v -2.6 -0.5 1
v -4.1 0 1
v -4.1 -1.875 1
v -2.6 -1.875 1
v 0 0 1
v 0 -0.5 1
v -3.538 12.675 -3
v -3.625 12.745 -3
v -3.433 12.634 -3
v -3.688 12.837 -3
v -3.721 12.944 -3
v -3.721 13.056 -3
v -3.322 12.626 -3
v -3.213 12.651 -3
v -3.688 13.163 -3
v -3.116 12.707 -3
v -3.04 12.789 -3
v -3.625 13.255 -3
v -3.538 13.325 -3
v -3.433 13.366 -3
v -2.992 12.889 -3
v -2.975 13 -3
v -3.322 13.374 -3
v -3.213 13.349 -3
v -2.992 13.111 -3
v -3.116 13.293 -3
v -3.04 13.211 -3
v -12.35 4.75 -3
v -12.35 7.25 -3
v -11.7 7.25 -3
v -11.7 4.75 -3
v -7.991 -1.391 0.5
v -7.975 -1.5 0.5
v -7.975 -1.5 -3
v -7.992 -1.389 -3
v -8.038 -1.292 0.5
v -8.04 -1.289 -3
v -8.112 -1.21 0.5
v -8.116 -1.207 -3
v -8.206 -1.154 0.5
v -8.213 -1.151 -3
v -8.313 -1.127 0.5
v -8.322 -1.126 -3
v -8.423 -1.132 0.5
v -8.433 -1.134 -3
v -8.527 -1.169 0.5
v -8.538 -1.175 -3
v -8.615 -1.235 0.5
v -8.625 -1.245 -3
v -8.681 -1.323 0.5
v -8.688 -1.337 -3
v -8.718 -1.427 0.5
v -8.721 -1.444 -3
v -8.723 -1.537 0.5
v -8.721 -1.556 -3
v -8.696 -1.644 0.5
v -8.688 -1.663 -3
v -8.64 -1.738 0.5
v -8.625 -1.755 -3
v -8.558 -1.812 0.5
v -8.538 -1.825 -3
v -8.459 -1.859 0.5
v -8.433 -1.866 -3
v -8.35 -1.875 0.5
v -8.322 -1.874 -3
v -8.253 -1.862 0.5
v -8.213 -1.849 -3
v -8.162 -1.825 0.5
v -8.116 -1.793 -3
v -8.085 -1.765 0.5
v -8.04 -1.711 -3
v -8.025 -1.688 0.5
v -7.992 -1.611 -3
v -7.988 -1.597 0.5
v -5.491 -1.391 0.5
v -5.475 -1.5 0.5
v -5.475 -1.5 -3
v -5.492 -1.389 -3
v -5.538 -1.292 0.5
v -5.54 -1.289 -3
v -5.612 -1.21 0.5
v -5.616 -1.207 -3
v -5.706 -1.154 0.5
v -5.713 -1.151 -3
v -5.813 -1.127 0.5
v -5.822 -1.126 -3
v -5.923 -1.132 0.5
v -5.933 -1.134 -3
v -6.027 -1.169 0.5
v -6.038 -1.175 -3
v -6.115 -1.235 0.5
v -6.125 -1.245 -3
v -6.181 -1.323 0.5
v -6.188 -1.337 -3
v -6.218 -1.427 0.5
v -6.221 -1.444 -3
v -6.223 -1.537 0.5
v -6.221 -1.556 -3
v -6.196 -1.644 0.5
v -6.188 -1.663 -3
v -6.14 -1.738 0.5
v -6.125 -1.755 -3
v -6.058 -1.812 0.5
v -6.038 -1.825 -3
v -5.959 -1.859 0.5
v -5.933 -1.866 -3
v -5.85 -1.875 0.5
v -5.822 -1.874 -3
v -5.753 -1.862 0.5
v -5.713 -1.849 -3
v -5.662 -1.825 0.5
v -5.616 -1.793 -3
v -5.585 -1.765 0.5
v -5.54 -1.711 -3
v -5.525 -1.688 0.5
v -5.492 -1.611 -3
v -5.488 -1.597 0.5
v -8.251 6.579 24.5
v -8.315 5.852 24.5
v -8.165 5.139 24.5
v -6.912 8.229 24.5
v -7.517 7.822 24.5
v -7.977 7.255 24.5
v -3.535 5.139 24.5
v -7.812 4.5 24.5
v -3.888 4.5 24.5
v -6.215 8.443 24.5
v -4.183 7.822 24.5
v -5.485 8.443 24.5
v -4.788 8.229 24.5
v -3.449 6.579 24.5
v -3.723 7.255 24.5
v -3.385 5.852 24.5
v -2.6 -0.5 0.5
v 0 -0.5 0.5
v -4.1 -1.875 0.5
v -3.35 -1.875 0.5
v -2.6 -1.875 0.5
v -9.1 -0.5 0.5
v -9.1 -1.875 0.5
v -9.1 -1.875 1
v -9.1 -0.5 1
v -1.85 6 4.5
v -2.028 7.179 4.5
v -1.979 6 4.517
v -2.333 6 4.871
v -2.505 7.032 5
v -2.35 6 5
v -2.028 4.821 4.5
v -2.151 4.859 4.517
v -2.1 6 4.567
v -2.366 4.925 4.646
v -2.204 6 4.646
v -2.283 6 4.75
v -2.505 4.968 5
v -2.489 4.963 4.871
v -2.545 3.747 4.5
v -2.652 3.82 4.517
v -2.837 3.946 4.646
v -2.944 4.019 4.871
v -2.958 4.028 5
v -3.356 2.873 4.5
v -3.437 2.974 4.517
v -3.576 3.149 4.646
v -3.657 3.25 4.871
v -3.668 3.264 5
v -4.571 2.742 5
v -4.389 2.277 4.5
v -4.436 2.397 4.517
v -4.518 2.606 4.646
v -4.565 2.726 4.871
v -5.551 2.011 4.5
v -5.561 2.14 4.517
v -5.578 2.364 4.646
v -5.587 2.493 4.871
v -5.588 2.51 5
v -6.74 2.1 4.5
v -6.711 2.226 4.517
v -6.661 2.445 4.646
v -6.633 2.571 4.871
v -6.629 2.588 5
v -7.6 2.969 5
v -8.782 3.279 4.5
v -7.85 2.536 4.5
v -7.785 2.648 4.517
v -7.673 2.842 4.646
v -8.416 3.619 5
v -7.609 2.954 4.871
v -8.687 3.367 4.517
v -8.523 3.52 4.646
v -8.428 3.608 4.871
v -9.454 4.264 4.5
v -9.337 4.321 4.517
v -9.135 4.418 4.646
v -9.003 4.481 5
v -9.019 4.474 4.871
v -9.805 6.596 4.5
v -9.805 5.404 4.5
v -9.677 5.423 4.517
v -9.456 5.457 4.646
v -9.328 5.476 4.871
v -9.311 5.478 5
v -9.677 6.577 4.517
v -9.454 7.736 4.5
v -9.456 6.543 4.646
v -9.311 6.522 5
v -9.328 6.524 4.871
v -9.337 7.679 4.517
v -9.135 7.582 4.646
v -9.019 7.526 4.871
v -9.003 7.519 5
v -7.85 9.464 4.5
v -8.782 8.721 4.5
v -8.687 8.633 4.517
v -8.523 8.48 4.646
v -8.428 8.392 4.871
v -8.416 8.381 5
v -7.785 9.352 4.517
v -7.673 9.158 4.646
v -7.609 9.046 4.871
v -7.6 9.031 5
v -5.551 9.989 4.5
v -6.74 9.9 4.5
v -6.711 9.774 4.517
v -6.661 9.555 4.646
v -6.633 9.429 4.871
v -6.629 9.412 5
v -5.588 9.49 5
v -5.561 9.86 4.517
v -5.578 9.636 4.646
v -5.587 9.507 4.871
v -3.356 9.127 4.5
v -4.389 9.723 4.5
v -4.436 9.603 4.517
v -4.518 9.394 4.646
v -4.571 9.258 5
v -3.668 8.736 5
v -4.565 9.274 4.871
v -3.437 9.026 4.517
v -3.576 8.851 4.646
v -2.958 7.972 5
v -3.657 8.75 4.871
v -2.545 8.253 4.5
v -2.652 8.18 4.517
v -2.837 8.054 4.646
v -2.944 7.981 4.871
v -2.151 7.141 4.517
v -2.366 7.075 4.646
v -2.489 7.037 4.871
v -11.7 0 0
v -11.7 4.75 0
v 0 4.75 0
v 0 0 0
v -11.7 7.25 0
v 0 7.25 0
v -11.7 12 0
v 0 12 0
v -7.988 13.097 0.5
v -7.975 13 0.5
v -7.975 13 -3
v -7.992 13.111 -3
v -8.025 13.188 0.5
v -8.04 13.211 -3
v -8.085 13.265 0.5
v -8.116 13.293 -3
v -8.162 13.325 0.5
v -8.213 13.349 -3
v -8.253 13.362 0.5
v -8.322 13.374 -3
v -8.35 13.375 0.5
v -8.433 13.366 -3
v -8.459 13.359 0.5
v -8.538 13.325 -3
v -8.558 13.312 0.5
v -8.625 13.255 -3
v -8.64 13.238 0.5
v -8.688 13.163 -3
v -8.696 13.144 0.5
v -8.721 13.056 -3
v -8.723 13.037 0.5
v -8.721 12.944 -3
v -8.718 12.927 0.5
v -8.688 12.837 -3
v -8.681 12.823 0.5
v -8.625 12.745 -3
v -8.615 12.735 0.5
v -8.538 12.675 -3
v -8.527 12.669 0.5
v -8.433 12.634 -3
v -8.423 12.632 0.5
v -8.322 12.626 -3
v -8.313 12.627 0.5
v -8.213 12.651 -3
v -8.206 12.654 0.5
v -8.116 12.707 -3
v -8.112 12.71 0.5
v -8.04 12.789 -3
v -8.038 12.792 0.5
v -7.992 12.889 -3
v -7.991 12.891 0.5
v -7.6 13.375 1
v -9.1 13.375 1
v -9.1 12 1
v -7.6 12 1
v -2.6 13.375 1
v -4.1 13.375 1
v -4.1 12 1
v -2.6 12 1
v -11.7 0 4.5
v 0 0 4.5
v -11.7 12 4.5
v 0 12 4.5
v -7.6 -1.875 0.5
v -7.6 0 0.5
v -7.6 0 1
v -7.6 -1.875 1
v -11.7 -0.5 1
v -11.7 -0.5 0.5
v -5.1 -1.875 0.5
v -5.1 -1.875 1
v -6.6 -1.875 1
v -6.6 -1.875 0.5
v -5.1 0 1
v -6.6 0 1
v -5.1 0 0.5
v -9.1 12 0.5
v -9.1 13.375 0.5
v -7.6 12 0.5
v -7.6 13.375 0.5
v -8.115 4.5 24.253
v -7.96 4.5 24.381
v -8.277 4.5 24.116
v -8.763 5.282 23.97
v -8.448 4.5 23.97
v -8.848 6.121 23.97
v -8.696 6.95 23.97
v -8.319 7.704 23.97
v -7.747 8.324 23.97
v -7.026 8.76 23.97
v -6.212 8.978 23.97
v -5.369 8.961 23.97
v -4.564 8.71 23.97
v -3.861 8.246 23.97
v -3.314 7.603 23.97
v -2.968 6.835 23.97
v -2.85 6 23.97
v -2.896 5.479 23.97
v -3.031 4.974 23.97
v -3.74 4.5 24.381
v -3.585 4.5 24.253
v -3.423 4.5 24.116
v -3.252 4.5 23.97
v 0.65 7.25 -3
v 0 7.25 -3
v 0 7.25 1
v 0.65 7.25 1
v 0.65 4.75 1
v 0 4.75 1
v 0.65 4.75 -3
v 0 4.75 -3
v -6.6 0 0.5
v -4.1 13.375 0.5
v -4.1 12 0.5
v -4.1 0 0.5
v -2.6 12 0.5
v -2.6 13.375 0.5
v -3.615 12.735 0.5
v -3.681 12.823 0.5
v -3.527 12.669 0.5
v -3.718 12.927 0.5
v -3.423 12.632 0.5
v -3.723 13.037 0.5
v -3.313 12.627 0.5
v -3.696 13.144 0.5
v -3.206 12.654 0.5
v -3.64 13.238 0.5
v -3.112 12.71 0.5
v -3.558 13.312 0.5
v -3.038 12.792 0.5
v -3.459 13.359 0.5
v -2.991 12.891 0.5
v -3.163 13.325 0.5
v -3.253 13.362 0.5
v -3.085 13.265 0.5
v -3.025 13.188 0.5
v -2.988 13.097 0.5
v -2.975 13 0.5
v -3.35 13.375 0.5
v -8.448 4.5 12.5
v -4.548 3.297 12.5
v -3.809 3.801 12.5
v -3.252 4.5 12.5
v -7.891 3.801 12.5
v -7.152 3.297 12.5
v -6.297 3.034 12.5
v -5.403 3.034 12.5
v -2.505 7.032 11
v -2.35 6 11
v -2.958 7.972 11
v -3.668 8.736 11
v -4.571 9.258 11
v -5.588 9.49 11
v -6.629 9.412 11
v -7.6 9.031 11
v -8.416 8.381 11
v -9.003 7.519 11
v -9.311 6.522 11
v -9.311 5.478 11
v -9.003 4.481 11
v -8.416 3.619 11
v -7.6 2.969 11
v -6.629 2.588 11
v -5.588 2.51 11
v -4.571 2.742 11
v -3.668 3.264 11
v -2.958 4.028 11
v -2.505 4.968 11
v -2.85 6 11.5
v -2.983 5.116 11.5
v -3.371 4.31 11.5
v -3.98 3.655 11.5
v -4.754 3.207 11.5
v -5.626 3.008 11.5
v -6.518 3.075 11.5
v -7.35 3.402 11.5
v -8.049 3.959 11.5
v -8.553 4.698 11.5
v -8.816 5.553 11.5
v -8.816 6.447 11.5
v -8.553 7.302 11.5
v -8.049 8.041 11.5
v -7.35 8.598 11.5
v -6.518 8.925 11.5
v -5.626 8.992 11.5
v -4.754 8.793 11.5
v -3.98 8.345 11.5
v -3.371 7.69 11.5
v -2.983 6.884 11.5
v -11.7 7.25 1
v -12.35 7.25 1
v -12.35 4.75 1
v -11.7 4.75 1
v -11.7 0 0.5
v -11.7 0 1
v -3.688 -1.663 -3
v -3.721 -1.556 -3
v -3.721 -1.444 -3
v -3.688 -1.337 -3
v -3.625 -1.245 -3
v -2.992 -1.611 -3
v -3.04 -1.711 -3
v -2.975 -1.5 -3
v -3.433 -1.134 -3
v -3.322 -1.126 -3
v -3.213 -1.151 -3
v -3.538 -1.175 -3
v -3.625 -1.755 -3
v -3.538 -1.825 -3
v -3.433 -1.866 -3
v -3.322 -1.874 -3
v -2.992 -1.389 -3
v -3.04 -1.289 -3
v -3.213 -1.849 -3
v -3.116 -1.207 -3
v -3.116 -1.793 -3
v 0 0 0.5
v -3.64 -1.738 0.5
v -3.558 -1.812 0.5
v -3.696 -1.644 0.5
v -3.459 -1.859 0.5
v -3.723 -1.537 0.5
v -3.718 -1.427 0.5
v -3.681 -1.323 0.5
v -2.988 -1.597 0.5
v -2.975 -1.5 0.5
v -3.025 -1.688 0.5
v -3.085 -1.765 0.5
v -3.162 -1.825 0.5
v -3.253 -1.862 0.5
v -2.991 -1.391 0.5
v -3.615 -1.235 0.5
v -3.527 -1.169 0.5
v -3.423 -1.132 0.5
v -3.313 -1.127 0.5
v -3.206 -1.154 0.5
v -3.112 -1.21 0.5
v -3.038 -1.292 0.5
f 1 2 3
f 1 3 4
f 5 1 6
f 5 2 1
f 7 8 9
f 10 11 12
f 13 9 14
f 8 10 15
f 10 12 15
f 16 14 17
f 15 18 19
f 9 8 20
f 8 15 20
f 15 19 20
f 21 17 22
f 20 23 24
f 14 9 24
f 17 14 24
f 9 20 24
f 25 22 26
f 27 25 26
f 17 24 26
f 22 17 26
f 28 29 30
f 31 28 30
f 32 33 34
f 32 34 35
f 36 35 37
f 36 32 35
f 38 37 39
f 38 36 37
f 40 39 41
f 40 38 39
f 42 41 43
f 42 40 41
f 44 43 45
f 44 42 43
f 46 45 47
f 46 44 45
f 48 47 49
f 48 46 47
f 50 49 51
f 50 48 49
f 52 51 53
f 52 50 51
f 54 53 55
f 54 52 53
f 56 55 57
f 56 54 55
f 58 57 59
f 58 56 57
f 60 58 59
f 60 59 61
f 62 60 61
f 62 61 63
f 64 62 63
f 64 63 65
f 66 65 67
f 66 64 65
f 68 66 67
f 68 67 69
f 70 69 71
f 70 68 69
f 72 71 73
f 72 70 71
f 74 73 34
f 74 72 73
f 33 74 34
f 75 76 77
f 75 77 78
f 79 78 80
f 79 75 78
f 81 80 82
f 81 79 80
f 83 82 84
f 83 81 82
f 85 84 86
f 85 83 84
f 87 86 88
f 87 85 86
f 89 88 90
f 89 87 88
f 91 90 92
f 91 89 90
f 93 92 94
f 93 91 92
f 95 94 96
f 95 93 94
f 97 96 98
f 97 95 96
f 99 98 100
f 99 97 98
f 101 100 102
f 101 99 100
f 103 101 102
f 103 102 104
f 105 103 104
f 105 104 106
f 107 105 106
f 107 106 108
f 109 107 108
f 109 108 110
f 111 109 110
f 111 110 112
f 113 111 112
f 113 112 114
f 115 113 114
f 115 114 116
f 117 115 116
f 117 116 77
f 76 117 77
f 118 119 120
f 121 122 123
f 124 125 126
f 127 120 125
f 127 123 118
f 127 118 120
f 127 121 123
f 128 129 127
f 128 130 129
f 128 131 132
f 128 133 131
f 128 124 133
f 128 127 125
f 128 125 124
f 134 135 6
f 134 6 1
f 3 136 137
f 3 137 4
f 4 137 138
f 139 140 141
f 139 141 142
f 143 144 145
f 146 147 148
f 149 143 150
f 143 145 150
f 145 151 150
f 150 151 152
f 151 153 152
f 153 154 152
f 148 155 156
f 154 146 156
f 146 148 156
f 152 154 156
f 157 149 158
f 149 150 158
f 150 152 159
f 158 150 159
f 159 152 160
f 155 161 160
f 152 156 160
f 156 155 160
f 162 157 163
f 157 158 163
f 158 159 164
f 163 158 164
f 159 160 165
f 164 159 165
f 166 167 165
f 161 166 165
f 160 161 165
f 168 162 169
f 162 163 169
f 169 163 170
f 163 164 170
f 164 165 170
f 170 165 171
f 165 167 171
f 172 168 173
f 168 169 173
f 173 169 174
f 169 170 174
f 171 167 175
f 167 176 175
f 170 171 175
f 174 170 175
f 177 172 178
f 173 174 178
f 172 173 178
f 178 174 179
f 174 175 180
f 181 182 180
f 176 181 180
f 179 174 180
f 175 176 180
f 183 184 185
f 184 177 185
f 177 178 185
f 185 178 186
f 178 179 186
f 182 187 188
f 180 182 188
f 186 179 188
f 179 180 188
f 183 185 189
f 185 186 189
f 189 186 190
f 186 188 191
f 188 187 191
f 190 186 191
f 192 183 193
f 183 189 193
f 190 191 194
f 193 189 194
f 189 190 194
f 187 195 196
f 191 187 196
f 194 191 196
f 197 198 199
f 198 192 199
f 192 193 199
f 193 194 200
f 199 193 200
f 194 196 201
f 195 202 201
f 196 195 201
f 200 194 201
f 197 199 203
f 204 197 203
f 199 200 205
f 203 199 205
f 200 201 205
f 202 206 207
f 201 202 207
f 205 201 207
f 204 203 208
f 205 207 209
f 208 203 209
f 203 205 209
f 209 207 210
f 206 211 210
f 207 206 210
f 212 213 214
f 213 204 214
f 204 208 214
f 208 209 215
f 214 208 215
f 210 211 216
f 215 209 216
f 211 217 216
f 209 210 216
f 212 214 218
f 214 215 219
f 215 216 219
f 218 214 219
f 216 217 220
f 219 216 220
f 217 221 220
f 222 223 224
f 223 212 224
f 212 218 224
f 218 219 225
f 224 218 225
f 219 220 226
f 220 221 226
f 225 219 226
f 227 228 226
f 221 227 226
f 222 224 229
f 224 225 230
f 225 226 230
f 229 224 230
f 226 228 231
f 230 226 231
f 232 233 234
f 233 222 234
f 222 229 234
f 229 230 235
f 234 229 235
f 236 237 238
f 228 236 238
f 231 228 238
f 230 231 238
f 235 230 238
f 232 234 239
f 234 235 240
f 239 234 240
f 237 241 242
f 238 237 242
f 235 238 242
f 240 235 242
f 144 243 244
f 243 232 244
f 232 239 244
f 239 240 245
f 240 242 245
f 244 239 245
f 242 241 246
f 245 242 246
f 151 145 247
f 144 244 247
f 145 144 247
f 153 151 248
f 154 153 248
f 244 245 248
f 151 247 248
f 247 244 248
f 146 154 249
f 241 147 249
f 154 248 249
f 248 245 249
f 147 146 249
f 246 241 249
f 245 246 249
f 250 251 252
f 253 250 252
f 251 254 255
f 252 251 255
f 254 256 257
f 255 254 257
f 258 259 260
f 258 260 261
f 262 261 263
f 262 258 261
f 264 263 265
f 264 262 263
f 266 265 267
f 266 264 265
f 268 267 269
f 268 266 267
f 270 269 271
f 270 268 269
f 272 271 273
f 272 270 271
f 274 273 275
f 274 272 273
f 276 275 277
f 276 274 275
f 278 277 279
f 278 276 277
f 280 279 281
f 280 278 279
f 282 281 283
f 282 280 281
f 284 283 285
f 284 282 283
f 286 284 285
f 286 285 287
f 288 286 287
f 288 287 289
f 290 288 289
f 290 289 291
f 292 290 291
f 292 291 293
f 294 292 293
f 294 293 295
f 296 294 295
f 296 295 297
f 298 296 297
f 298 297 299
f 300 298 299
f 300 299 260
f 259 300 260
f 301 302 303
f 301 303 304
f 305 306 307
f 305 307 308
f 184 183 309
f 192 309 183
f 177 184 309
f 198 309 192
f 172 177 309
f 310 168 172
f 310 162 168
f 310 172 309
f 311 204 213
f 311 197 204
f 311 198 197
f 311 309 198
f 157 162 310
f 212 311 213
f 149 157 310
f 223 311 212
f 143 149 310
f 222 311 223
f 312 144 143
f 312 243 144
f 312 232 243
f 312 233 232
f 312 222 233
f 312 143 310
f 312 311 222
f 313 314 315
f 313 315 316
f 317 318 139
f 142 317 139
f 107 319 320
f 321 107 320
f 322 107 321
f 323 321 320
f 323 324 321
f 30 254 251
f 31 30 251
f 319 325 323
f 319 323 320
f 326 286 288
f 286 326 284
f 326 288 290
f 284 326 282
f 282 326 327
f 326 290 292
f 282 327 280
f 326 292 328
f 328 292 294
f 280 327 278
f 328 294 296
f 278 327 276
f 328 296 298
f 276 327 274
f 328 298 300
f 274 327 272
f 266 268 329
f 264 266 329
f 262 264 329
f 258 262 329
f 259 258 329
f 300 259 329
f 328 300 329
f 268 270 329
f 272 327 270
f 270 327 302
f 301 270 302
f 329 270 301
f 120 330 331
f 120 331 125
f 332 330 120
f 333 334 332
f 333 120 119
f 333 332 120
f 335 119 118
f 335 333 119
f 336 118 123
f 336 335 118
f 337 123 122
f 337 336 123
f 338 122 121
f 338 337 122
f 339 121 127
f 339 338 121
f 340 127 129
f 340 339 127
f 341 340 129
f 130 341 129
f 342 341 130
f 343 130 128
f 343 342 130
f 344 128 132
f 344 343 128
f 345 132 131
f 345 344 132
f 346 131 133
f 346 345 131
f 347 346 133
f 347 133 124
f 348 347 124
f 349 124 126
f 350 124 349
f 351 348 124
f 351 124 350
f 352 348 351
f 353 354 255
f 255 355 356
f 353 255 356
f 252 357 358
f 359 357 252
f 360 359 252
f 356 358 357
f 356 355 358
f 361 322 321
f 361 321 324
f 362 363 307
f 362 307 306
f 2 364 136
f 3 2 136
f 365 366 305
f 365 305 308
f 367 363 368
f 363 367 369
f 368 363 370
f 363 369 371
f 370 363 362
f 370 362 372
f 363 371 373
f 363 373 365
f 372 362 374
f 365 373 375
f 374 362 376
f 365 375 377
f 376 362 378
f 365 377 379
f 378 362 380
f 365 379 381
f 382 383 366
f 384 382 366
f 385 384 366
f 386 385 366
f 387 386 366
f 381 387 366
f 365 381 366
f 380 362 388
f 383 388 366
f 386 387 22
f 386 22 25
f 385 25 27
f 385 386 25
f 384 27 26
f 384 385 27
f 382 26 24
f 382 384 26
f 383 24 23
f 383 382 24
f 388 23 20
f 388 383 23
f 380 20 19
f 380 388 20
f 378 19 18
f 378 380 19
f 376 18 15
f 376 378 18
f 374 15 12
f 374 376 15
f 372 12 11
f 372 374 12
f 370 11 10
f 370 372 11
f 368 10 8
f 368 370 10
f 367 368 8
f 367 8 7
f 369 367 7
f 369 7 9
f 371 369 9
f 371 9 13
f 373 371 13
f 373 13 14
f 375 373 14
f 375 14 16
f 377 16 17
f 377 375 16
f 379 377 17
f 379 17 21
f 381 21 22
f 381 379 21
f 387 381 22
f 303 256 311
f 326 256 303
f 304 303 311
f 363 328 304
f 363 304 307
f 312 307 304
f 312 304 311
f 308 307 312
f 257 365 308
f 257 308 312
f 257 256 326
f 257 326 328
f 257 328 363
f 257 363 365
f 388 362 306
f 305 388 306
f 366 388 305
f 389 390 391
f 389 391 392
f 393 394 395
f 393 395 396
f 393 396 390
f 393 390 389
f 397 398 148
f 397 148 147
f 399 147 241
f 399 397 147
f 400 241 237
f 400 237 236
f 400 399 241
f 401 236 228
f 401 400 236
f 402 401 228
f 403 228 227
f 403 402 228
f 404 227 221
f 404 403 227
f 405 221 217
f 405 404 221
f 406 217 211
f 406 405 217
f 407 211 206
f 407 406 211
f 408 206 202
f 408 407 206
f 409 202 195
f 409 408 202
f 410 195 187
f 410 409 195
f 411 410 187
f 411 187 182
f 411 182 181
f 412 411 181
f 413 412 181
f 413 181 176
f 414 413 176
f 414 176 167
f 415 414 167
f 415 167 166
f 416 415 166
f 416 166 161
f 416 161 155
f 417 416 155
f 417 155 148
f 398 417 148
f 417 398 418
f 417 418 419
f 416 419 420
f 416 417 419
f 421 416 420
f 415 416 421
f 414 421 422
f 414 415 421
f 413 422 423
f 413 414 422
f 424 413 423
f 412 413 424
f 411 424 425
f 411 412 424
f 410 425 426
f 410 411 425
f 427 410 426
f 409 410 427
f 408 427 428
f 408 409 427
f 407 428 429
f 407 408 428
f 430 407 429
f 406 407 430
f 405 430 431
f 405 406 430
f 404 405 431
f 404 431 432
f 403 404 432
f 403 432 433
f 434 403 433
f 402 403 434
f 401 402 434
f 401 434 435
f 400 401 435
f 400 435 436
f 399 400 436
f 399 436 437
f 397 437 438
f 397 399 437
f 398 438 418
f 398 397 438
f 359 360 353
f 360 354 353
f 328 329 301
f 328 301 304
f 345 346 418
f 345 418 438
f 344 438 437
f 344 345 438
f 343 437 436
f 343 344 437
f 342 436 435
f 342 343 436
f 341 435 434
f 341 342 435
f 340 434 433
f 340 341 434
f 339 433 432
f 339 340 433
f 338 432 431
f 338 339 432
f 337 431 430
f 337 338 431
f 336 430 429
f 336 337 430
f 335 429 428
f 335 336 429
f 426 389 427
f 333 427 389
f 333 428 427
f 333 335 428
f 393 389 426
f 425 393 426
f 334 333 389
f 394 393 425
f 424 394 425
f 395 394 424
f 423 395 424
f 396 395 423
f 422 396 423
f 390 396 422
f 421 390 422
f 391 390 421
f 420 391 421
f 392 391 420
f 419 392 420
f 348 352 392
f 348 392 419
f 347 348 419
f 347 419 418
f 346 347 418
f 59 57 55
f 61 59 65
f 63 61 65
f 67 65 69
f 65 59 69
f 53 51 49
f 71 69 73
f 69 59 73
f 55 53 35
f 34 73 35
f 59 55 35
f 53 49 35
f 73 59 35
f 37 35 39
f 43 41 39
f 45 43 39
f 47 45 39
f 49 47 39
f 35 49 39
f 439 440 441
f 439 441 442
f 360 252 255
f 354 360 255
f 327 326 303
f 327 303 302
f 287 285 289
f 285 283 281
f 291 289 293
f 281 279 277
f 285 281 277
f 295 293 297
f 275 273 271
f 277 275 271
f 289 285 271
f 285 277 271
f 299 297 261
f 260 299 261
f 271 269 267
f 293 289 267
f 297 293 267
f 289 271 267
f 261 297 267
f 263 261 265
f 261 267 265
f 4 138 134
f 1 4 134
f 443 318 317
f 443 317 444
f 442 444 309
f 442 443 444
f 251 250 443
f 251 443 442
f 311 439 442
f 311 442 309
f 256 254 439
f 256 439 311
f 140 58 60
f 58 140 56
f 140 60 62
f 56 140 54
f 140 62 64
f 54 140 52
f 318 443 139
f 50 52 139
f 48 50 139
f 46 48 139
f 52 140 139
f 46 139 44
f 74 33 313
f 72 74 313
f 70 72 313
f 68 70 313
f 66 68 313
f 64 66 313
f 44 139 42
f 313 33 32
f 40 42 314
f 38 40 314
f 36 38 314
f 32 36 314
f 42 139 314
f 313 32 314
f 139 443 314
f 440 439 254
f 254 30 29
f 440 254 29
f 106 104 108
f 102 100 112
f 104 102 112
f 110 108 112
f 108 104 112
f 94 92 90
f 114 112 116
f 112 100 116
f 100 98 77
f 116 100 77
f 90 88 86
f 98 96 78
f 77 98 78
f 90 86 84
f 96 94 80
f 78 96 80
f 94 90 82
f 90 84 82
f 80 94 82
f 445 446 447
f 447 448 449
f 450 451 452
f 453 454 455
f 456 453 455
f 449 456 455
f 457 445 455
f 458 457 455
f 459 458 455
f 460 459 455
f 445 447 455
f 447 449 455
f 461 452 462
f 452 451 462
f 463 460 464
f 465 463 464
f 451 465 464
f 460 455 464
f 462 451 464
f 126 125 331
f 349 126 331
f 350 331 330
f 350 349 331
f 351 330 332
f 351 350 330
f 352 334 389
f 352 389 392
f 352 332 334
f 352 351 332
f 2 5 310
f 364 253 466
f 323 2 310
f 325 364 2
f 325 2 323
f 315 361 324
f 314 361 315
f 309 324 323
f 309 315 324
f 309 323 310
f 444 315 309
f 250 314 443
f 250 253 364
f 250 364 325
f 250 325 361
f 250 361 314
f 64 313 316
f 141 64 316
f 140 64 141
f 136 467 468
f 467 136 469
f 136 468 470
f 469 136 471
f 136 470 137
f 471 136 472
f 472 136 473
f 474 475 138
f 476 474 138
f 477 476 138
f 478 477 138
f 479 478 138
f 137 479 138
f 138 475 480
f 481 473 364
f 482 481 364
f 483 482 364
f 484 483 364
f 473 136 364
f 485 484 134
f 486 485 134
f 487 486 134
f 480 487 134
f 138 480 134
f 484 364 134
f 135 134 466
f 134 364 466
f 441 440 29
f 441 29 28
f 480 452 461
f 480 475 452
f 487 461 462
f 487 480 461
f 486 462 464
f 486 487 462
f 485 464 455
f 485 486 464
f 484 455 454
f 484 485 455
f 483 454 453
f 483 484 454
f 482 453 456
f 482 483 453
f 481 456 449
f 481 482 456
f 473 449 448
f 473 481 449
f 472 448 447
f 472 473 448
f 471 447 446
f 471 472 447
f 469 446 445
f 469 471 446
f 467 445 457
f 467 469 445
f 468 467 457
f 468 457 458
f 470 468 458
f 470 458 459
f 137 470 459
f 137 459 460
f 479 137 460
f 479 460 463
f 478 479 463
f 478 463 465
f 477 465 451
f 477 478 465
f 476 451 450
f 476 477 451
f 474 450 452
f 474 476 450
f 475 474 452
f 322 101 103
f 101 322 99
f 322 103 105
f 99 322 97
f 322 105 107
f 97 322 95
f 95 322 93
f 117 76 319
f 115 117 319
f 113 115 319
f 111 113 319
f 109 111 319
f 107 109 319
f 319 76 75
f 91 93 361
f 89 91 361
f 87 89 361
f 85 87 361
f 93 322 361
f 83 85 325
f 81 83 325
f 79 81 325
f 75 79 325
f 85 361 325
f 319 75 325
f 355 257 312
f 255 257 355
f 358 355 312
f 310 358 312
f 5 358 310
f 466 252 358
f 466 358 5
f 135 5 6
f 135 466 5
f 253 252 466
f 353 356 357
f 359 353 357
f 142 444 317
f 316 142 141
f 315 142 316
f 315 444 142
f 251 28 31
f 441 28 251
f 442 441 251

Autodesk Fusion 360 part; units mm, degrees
sketch "Skizze1" plane through (0, 0, 0) normal (0, 0, 1) x (1, 0, 0)
  line L0 (0, 0) -> (-11.7, 0)
  line L1 (-11.7, 0) -> (-11.7, 12)
  line L2 (-11.7, 12) -> (0, 12)
  line L3 (0, 12) -> (0, 0)
  dimension "d1" = 11.7
  dimension "d2" = 12
extrude "Extrusion1" add sketch "Skizze1" along normal blind 4.5
ref_plane "Arbeitsebene1" through (0, 0, 0.5) normal (0, 0, 1) x (1, 0, 0)
sketch "Skizze2" plane through (0, 0, 0.5) normal (0, 0, 1) x (1, 0, 0)
  line L0 (0, 12) -> (-11.7, 12)
  line L1 (-11.7, 12) -> (-11.7, 0)
  line L2 (-11.7, 0) -> (0, 0)
  line L3 (0, 0) -> (0, 12)
  line L4 (-8.35, 12) -> (-8.35, 19) construction
  line L5 (-3.35, 12) -> (-3.35, 19) construction
  line L6 (-8.35, 0) -> (-8.35, -5) construction
  line L7 (-5.85, 0) -> (-5.85, -5) construction
  line L8 (-3.35, 0) -> (-3.35, -5) construction
  line L9 (-7.6, 12) -> (-9.1, 12)
  line L10 (-9.1, 12) -> (-9.1, 13.375)
  line L11 (-9.1, 13.375) -> (-7.6, 13.375)
  line L12 (-7.6, 13.375) -> (-7.6, 12)
  line L13 (-2.6, 12) -> (-4.1, 12)
  line L14 (-4.1, 12) -> (-4.1, 13.375)
  line L15 (-4.1, 13.375) -> (-2.6, 13.375)
  line L16 (-2.6, 13.375) -> (-2.6, 12)
  line L17 (-2.6, 0) -> (-4.1, 0)
  line L18 (-4.1, 0) -> (-4.1, -1.875)
  line L19 (-4.1, -1.875) -> (-2.6, -1.875)
  line L20 (-2.6, -1.875) -> (-2.6, 0)
  line L21 (-6.6, 0) -> (-5.1, 0)
  line L22 (-5.1, 0) -> (-5.1, -1.875)
  line L23 (-5.1, -1.875) -> (-6.6, -1.875)
  line L24 (-6.6, -1.875) -> (-6.6, 0)
  line L25 (-9.1, 0) -> (-7.6, 0)
  line L26 (-7.6, 0) -> (-7.6, -1.875)
  line L27 (-7.6, -1.875) -> (-9.1, -1.875)
  line L28 (-9.1, -1.875) -> (-9.1, 0)
  line L29 (-9.1, 0) -> (-11.7, 0)
  line L30 (-11.7, 0) -> (-11.7, -0.5)
  line L31 (-11.7, -0.5) -> (-9.1, -0.5)
  line L32 (-9.1, -0.5) -> (-9.1, 0)
  line L33 (-2.6, 0) -> (0, 0)
  line L34 (0, 0) -> (0, -0.5)
  line L35 (0, -0.5) -> (-2.6, -0.5)
  line L36 (-2.6, -0.5) -> (-2.6, 0)
  circle A0 centre (-8.35, 13) radius 0.375
  circle A1 centre (-3.35, 13) radius 0.375
  circle A2 centre (-8.35, -1.5) radius 0.375
  circle A3 centre (-5.85, -1.5) radius 0.375
  circle A4 centre (-3.35, -1.5) radius 0.375
  line L37 (-11.7, 6) -> (0, 6) construction
  line L38 (-11.7, 7.25) -> (-12.35, 7.25)
  line L39 (-12.35, 7.25) -> (-12.35, 4.75)
  line L40 (-12.35, 4.75) -> (-11.7, 4.75)
  line L41 (-11.7, 4.75) -> (-11.7, 7.25)
  line L42 (0, 7.25) -> (0.65, 7.25)
  line L43 (0.65, 7.25) -> (0.65, 4.75)
  line L44 (0.65, 4.75) -> (0, 4.75)
  line L45 (0, 4.75) -> (0, 7.25)
  line L46 (-11.6, 7.25) -> (-11.6, 4.75)
  line L47 (-0.1, 7.25) -> (-0.1, 4.75)
  dimension "d7" = 5
  dimension "d8" = 5
  dimension "d9" = 1.5
  dimension "d11" = 0.5
  dimension "d12" = 0.75
  dimension "d13" = 0.75
  dimension "d14" = 0.75
  dimension "d15" = 0.75
  dimension "d16" = 0.75
  dimension "d17" = 7
  dimension "d18" = 7
  dimension "d19" = 7.5
  dimension "d20" = 7.5
  dimension "d21" = 7.5
  dimension "d26" = 0.75
  dimension "d27" = 0.75
  dimension "d28" = 13
  dimension "d46" = 2.5
extrude "Extrusion2" add sketch "Skizze2" along normal blind 0.5 contours A1 | L0 L13 L14 L15 L16 | L3 L42 L43 L44 L45 | A0 | L0 L9 L10 L11 L12 | L2 L20 L33 L34 L35 L36 | A4 | L2 L17 L18 L19 L20 L36 | L1 L38 L39 L40 L41 | A3 | L2 L21 L22 L23 L24 | L2 L28 L29 L30 L31 L32 | A2 | L2 L25 L26 L27 L28 L32
extrude "Extrusion3" add sketch "Skizze2" against normal blind 3.5 contours A1 | L3 L42 L43 L44 L45 | A0 | A4 | L1 L38 L39 L40 L41 | A3 | A2
ref_plane "Arbeitsebene2" through (0, 6, 0) normal (0, 1, 0) x (0, 0, 1)
sketch "Skizze3" plane through (0, 6, 0) normal (0, 1, 0) x (1, 0, 0)
  line L0 (-4.1, -1) -> (0, -1)
  line L1 (0, -1) -> (0, -4.5)
  line L2 (0, -4.5) -> (-11.7, -4.5)
  line L3 (-11.7, -4.5) -> (-11.7, -1)
  line L4 (-11.7, -1) -> (-7.6, -1)
  line L5 (-7.6, -1) -> (-7.6, -0.5)
  line L6 (-7.6, -0.5) -> (-11.7, -0.5)
  line L7 (-11.7, -0.5) -> (-11.7, 0)
  line L8 (-11.7, 0) -> (0, 0)
  line L9 (0, 0) -> (0, -0.5)
  line L10 (0, -0.5) -> (-4.1, -0.5)
  line L11 (-4.1, -0.5) -> (-4.1, -1)
  line L12 (-5.1, -1) -> (-5.1, -0.5)
  line L13 (-5.1, -0.5) -> (-6.6, -0.5)
  line L14 (-6.6, -0.5) -> (-6.6, -1)
  line L15 (-6.6, -1) -> (-5.1, -1)
  line L16 (-5.85, -4.5) -> (-5.85, -18.5)
  line L17 (-5.85, -4.5) -> (-1.85, -4.5)
  line L18 (-2.35, -5) -> (-2.35, -11)
  arc A0 (-1.85, -4.5) -> (-2.35, -5) centre (-1.85, -5) ccw
  line L19 (-2.35, -11) -> (-2.85, -11.5)
  line L20 (-2.85, -11.5) -> (-2.85, -23.9697)
  line L21 (-2.85, -23.9697) -> (-3.3803, -24.5)
  line L22 (-3.3803, -24.5) -> (-5.85, -24.5)
  line L23 (-5.85, -24.5) -> (-5.85, -4.5)
  dimension "d31" = 1
  dimension "d32" = 7
  dimension "d33" = 6
  dimension "d34" = 135
  dimension "d35" = 135
  dimension "d36" = 7
  dimension "d40" = 0.75
  dimension "d41" = 20
revolve "Drehen1" add sketch "Skizze3" angle 360 about axis through (-5.85, 6, 4.5) along (0, 0, 1) contours L2 L16 L17 L18 A0 L19 L20 L21 L22 L23
sketch "Skizze4" plane through (0, 0, 24.5) normal (0, 0, 1) x (-1, 0, 0)
  circle A0 centre (5.85, -6) radius 2.4697
  circle A1 centre (5.85, -6) radius 3
  line L0 (8.4481, -4.5) -> (3.2519, -4.5)
  arc A2 (8.4481, -4.5) -> (3.2519, -4.5) centre (5.85, -6) ccw
  line L1 (5.85, -4.5) -> (5.85, -9) construction
  dimension "d43" = 4.5
extrude "Extrusion4" cut sketch "Skizze4" against normal blind 12 contours A0 L0 | A0 A1 L0 A2 picked at (5.6769, -4.1952)
equation "d13 = d12"
equation "d14 = d12"
equation "d15 = d12"
equation "d16 = d12"
